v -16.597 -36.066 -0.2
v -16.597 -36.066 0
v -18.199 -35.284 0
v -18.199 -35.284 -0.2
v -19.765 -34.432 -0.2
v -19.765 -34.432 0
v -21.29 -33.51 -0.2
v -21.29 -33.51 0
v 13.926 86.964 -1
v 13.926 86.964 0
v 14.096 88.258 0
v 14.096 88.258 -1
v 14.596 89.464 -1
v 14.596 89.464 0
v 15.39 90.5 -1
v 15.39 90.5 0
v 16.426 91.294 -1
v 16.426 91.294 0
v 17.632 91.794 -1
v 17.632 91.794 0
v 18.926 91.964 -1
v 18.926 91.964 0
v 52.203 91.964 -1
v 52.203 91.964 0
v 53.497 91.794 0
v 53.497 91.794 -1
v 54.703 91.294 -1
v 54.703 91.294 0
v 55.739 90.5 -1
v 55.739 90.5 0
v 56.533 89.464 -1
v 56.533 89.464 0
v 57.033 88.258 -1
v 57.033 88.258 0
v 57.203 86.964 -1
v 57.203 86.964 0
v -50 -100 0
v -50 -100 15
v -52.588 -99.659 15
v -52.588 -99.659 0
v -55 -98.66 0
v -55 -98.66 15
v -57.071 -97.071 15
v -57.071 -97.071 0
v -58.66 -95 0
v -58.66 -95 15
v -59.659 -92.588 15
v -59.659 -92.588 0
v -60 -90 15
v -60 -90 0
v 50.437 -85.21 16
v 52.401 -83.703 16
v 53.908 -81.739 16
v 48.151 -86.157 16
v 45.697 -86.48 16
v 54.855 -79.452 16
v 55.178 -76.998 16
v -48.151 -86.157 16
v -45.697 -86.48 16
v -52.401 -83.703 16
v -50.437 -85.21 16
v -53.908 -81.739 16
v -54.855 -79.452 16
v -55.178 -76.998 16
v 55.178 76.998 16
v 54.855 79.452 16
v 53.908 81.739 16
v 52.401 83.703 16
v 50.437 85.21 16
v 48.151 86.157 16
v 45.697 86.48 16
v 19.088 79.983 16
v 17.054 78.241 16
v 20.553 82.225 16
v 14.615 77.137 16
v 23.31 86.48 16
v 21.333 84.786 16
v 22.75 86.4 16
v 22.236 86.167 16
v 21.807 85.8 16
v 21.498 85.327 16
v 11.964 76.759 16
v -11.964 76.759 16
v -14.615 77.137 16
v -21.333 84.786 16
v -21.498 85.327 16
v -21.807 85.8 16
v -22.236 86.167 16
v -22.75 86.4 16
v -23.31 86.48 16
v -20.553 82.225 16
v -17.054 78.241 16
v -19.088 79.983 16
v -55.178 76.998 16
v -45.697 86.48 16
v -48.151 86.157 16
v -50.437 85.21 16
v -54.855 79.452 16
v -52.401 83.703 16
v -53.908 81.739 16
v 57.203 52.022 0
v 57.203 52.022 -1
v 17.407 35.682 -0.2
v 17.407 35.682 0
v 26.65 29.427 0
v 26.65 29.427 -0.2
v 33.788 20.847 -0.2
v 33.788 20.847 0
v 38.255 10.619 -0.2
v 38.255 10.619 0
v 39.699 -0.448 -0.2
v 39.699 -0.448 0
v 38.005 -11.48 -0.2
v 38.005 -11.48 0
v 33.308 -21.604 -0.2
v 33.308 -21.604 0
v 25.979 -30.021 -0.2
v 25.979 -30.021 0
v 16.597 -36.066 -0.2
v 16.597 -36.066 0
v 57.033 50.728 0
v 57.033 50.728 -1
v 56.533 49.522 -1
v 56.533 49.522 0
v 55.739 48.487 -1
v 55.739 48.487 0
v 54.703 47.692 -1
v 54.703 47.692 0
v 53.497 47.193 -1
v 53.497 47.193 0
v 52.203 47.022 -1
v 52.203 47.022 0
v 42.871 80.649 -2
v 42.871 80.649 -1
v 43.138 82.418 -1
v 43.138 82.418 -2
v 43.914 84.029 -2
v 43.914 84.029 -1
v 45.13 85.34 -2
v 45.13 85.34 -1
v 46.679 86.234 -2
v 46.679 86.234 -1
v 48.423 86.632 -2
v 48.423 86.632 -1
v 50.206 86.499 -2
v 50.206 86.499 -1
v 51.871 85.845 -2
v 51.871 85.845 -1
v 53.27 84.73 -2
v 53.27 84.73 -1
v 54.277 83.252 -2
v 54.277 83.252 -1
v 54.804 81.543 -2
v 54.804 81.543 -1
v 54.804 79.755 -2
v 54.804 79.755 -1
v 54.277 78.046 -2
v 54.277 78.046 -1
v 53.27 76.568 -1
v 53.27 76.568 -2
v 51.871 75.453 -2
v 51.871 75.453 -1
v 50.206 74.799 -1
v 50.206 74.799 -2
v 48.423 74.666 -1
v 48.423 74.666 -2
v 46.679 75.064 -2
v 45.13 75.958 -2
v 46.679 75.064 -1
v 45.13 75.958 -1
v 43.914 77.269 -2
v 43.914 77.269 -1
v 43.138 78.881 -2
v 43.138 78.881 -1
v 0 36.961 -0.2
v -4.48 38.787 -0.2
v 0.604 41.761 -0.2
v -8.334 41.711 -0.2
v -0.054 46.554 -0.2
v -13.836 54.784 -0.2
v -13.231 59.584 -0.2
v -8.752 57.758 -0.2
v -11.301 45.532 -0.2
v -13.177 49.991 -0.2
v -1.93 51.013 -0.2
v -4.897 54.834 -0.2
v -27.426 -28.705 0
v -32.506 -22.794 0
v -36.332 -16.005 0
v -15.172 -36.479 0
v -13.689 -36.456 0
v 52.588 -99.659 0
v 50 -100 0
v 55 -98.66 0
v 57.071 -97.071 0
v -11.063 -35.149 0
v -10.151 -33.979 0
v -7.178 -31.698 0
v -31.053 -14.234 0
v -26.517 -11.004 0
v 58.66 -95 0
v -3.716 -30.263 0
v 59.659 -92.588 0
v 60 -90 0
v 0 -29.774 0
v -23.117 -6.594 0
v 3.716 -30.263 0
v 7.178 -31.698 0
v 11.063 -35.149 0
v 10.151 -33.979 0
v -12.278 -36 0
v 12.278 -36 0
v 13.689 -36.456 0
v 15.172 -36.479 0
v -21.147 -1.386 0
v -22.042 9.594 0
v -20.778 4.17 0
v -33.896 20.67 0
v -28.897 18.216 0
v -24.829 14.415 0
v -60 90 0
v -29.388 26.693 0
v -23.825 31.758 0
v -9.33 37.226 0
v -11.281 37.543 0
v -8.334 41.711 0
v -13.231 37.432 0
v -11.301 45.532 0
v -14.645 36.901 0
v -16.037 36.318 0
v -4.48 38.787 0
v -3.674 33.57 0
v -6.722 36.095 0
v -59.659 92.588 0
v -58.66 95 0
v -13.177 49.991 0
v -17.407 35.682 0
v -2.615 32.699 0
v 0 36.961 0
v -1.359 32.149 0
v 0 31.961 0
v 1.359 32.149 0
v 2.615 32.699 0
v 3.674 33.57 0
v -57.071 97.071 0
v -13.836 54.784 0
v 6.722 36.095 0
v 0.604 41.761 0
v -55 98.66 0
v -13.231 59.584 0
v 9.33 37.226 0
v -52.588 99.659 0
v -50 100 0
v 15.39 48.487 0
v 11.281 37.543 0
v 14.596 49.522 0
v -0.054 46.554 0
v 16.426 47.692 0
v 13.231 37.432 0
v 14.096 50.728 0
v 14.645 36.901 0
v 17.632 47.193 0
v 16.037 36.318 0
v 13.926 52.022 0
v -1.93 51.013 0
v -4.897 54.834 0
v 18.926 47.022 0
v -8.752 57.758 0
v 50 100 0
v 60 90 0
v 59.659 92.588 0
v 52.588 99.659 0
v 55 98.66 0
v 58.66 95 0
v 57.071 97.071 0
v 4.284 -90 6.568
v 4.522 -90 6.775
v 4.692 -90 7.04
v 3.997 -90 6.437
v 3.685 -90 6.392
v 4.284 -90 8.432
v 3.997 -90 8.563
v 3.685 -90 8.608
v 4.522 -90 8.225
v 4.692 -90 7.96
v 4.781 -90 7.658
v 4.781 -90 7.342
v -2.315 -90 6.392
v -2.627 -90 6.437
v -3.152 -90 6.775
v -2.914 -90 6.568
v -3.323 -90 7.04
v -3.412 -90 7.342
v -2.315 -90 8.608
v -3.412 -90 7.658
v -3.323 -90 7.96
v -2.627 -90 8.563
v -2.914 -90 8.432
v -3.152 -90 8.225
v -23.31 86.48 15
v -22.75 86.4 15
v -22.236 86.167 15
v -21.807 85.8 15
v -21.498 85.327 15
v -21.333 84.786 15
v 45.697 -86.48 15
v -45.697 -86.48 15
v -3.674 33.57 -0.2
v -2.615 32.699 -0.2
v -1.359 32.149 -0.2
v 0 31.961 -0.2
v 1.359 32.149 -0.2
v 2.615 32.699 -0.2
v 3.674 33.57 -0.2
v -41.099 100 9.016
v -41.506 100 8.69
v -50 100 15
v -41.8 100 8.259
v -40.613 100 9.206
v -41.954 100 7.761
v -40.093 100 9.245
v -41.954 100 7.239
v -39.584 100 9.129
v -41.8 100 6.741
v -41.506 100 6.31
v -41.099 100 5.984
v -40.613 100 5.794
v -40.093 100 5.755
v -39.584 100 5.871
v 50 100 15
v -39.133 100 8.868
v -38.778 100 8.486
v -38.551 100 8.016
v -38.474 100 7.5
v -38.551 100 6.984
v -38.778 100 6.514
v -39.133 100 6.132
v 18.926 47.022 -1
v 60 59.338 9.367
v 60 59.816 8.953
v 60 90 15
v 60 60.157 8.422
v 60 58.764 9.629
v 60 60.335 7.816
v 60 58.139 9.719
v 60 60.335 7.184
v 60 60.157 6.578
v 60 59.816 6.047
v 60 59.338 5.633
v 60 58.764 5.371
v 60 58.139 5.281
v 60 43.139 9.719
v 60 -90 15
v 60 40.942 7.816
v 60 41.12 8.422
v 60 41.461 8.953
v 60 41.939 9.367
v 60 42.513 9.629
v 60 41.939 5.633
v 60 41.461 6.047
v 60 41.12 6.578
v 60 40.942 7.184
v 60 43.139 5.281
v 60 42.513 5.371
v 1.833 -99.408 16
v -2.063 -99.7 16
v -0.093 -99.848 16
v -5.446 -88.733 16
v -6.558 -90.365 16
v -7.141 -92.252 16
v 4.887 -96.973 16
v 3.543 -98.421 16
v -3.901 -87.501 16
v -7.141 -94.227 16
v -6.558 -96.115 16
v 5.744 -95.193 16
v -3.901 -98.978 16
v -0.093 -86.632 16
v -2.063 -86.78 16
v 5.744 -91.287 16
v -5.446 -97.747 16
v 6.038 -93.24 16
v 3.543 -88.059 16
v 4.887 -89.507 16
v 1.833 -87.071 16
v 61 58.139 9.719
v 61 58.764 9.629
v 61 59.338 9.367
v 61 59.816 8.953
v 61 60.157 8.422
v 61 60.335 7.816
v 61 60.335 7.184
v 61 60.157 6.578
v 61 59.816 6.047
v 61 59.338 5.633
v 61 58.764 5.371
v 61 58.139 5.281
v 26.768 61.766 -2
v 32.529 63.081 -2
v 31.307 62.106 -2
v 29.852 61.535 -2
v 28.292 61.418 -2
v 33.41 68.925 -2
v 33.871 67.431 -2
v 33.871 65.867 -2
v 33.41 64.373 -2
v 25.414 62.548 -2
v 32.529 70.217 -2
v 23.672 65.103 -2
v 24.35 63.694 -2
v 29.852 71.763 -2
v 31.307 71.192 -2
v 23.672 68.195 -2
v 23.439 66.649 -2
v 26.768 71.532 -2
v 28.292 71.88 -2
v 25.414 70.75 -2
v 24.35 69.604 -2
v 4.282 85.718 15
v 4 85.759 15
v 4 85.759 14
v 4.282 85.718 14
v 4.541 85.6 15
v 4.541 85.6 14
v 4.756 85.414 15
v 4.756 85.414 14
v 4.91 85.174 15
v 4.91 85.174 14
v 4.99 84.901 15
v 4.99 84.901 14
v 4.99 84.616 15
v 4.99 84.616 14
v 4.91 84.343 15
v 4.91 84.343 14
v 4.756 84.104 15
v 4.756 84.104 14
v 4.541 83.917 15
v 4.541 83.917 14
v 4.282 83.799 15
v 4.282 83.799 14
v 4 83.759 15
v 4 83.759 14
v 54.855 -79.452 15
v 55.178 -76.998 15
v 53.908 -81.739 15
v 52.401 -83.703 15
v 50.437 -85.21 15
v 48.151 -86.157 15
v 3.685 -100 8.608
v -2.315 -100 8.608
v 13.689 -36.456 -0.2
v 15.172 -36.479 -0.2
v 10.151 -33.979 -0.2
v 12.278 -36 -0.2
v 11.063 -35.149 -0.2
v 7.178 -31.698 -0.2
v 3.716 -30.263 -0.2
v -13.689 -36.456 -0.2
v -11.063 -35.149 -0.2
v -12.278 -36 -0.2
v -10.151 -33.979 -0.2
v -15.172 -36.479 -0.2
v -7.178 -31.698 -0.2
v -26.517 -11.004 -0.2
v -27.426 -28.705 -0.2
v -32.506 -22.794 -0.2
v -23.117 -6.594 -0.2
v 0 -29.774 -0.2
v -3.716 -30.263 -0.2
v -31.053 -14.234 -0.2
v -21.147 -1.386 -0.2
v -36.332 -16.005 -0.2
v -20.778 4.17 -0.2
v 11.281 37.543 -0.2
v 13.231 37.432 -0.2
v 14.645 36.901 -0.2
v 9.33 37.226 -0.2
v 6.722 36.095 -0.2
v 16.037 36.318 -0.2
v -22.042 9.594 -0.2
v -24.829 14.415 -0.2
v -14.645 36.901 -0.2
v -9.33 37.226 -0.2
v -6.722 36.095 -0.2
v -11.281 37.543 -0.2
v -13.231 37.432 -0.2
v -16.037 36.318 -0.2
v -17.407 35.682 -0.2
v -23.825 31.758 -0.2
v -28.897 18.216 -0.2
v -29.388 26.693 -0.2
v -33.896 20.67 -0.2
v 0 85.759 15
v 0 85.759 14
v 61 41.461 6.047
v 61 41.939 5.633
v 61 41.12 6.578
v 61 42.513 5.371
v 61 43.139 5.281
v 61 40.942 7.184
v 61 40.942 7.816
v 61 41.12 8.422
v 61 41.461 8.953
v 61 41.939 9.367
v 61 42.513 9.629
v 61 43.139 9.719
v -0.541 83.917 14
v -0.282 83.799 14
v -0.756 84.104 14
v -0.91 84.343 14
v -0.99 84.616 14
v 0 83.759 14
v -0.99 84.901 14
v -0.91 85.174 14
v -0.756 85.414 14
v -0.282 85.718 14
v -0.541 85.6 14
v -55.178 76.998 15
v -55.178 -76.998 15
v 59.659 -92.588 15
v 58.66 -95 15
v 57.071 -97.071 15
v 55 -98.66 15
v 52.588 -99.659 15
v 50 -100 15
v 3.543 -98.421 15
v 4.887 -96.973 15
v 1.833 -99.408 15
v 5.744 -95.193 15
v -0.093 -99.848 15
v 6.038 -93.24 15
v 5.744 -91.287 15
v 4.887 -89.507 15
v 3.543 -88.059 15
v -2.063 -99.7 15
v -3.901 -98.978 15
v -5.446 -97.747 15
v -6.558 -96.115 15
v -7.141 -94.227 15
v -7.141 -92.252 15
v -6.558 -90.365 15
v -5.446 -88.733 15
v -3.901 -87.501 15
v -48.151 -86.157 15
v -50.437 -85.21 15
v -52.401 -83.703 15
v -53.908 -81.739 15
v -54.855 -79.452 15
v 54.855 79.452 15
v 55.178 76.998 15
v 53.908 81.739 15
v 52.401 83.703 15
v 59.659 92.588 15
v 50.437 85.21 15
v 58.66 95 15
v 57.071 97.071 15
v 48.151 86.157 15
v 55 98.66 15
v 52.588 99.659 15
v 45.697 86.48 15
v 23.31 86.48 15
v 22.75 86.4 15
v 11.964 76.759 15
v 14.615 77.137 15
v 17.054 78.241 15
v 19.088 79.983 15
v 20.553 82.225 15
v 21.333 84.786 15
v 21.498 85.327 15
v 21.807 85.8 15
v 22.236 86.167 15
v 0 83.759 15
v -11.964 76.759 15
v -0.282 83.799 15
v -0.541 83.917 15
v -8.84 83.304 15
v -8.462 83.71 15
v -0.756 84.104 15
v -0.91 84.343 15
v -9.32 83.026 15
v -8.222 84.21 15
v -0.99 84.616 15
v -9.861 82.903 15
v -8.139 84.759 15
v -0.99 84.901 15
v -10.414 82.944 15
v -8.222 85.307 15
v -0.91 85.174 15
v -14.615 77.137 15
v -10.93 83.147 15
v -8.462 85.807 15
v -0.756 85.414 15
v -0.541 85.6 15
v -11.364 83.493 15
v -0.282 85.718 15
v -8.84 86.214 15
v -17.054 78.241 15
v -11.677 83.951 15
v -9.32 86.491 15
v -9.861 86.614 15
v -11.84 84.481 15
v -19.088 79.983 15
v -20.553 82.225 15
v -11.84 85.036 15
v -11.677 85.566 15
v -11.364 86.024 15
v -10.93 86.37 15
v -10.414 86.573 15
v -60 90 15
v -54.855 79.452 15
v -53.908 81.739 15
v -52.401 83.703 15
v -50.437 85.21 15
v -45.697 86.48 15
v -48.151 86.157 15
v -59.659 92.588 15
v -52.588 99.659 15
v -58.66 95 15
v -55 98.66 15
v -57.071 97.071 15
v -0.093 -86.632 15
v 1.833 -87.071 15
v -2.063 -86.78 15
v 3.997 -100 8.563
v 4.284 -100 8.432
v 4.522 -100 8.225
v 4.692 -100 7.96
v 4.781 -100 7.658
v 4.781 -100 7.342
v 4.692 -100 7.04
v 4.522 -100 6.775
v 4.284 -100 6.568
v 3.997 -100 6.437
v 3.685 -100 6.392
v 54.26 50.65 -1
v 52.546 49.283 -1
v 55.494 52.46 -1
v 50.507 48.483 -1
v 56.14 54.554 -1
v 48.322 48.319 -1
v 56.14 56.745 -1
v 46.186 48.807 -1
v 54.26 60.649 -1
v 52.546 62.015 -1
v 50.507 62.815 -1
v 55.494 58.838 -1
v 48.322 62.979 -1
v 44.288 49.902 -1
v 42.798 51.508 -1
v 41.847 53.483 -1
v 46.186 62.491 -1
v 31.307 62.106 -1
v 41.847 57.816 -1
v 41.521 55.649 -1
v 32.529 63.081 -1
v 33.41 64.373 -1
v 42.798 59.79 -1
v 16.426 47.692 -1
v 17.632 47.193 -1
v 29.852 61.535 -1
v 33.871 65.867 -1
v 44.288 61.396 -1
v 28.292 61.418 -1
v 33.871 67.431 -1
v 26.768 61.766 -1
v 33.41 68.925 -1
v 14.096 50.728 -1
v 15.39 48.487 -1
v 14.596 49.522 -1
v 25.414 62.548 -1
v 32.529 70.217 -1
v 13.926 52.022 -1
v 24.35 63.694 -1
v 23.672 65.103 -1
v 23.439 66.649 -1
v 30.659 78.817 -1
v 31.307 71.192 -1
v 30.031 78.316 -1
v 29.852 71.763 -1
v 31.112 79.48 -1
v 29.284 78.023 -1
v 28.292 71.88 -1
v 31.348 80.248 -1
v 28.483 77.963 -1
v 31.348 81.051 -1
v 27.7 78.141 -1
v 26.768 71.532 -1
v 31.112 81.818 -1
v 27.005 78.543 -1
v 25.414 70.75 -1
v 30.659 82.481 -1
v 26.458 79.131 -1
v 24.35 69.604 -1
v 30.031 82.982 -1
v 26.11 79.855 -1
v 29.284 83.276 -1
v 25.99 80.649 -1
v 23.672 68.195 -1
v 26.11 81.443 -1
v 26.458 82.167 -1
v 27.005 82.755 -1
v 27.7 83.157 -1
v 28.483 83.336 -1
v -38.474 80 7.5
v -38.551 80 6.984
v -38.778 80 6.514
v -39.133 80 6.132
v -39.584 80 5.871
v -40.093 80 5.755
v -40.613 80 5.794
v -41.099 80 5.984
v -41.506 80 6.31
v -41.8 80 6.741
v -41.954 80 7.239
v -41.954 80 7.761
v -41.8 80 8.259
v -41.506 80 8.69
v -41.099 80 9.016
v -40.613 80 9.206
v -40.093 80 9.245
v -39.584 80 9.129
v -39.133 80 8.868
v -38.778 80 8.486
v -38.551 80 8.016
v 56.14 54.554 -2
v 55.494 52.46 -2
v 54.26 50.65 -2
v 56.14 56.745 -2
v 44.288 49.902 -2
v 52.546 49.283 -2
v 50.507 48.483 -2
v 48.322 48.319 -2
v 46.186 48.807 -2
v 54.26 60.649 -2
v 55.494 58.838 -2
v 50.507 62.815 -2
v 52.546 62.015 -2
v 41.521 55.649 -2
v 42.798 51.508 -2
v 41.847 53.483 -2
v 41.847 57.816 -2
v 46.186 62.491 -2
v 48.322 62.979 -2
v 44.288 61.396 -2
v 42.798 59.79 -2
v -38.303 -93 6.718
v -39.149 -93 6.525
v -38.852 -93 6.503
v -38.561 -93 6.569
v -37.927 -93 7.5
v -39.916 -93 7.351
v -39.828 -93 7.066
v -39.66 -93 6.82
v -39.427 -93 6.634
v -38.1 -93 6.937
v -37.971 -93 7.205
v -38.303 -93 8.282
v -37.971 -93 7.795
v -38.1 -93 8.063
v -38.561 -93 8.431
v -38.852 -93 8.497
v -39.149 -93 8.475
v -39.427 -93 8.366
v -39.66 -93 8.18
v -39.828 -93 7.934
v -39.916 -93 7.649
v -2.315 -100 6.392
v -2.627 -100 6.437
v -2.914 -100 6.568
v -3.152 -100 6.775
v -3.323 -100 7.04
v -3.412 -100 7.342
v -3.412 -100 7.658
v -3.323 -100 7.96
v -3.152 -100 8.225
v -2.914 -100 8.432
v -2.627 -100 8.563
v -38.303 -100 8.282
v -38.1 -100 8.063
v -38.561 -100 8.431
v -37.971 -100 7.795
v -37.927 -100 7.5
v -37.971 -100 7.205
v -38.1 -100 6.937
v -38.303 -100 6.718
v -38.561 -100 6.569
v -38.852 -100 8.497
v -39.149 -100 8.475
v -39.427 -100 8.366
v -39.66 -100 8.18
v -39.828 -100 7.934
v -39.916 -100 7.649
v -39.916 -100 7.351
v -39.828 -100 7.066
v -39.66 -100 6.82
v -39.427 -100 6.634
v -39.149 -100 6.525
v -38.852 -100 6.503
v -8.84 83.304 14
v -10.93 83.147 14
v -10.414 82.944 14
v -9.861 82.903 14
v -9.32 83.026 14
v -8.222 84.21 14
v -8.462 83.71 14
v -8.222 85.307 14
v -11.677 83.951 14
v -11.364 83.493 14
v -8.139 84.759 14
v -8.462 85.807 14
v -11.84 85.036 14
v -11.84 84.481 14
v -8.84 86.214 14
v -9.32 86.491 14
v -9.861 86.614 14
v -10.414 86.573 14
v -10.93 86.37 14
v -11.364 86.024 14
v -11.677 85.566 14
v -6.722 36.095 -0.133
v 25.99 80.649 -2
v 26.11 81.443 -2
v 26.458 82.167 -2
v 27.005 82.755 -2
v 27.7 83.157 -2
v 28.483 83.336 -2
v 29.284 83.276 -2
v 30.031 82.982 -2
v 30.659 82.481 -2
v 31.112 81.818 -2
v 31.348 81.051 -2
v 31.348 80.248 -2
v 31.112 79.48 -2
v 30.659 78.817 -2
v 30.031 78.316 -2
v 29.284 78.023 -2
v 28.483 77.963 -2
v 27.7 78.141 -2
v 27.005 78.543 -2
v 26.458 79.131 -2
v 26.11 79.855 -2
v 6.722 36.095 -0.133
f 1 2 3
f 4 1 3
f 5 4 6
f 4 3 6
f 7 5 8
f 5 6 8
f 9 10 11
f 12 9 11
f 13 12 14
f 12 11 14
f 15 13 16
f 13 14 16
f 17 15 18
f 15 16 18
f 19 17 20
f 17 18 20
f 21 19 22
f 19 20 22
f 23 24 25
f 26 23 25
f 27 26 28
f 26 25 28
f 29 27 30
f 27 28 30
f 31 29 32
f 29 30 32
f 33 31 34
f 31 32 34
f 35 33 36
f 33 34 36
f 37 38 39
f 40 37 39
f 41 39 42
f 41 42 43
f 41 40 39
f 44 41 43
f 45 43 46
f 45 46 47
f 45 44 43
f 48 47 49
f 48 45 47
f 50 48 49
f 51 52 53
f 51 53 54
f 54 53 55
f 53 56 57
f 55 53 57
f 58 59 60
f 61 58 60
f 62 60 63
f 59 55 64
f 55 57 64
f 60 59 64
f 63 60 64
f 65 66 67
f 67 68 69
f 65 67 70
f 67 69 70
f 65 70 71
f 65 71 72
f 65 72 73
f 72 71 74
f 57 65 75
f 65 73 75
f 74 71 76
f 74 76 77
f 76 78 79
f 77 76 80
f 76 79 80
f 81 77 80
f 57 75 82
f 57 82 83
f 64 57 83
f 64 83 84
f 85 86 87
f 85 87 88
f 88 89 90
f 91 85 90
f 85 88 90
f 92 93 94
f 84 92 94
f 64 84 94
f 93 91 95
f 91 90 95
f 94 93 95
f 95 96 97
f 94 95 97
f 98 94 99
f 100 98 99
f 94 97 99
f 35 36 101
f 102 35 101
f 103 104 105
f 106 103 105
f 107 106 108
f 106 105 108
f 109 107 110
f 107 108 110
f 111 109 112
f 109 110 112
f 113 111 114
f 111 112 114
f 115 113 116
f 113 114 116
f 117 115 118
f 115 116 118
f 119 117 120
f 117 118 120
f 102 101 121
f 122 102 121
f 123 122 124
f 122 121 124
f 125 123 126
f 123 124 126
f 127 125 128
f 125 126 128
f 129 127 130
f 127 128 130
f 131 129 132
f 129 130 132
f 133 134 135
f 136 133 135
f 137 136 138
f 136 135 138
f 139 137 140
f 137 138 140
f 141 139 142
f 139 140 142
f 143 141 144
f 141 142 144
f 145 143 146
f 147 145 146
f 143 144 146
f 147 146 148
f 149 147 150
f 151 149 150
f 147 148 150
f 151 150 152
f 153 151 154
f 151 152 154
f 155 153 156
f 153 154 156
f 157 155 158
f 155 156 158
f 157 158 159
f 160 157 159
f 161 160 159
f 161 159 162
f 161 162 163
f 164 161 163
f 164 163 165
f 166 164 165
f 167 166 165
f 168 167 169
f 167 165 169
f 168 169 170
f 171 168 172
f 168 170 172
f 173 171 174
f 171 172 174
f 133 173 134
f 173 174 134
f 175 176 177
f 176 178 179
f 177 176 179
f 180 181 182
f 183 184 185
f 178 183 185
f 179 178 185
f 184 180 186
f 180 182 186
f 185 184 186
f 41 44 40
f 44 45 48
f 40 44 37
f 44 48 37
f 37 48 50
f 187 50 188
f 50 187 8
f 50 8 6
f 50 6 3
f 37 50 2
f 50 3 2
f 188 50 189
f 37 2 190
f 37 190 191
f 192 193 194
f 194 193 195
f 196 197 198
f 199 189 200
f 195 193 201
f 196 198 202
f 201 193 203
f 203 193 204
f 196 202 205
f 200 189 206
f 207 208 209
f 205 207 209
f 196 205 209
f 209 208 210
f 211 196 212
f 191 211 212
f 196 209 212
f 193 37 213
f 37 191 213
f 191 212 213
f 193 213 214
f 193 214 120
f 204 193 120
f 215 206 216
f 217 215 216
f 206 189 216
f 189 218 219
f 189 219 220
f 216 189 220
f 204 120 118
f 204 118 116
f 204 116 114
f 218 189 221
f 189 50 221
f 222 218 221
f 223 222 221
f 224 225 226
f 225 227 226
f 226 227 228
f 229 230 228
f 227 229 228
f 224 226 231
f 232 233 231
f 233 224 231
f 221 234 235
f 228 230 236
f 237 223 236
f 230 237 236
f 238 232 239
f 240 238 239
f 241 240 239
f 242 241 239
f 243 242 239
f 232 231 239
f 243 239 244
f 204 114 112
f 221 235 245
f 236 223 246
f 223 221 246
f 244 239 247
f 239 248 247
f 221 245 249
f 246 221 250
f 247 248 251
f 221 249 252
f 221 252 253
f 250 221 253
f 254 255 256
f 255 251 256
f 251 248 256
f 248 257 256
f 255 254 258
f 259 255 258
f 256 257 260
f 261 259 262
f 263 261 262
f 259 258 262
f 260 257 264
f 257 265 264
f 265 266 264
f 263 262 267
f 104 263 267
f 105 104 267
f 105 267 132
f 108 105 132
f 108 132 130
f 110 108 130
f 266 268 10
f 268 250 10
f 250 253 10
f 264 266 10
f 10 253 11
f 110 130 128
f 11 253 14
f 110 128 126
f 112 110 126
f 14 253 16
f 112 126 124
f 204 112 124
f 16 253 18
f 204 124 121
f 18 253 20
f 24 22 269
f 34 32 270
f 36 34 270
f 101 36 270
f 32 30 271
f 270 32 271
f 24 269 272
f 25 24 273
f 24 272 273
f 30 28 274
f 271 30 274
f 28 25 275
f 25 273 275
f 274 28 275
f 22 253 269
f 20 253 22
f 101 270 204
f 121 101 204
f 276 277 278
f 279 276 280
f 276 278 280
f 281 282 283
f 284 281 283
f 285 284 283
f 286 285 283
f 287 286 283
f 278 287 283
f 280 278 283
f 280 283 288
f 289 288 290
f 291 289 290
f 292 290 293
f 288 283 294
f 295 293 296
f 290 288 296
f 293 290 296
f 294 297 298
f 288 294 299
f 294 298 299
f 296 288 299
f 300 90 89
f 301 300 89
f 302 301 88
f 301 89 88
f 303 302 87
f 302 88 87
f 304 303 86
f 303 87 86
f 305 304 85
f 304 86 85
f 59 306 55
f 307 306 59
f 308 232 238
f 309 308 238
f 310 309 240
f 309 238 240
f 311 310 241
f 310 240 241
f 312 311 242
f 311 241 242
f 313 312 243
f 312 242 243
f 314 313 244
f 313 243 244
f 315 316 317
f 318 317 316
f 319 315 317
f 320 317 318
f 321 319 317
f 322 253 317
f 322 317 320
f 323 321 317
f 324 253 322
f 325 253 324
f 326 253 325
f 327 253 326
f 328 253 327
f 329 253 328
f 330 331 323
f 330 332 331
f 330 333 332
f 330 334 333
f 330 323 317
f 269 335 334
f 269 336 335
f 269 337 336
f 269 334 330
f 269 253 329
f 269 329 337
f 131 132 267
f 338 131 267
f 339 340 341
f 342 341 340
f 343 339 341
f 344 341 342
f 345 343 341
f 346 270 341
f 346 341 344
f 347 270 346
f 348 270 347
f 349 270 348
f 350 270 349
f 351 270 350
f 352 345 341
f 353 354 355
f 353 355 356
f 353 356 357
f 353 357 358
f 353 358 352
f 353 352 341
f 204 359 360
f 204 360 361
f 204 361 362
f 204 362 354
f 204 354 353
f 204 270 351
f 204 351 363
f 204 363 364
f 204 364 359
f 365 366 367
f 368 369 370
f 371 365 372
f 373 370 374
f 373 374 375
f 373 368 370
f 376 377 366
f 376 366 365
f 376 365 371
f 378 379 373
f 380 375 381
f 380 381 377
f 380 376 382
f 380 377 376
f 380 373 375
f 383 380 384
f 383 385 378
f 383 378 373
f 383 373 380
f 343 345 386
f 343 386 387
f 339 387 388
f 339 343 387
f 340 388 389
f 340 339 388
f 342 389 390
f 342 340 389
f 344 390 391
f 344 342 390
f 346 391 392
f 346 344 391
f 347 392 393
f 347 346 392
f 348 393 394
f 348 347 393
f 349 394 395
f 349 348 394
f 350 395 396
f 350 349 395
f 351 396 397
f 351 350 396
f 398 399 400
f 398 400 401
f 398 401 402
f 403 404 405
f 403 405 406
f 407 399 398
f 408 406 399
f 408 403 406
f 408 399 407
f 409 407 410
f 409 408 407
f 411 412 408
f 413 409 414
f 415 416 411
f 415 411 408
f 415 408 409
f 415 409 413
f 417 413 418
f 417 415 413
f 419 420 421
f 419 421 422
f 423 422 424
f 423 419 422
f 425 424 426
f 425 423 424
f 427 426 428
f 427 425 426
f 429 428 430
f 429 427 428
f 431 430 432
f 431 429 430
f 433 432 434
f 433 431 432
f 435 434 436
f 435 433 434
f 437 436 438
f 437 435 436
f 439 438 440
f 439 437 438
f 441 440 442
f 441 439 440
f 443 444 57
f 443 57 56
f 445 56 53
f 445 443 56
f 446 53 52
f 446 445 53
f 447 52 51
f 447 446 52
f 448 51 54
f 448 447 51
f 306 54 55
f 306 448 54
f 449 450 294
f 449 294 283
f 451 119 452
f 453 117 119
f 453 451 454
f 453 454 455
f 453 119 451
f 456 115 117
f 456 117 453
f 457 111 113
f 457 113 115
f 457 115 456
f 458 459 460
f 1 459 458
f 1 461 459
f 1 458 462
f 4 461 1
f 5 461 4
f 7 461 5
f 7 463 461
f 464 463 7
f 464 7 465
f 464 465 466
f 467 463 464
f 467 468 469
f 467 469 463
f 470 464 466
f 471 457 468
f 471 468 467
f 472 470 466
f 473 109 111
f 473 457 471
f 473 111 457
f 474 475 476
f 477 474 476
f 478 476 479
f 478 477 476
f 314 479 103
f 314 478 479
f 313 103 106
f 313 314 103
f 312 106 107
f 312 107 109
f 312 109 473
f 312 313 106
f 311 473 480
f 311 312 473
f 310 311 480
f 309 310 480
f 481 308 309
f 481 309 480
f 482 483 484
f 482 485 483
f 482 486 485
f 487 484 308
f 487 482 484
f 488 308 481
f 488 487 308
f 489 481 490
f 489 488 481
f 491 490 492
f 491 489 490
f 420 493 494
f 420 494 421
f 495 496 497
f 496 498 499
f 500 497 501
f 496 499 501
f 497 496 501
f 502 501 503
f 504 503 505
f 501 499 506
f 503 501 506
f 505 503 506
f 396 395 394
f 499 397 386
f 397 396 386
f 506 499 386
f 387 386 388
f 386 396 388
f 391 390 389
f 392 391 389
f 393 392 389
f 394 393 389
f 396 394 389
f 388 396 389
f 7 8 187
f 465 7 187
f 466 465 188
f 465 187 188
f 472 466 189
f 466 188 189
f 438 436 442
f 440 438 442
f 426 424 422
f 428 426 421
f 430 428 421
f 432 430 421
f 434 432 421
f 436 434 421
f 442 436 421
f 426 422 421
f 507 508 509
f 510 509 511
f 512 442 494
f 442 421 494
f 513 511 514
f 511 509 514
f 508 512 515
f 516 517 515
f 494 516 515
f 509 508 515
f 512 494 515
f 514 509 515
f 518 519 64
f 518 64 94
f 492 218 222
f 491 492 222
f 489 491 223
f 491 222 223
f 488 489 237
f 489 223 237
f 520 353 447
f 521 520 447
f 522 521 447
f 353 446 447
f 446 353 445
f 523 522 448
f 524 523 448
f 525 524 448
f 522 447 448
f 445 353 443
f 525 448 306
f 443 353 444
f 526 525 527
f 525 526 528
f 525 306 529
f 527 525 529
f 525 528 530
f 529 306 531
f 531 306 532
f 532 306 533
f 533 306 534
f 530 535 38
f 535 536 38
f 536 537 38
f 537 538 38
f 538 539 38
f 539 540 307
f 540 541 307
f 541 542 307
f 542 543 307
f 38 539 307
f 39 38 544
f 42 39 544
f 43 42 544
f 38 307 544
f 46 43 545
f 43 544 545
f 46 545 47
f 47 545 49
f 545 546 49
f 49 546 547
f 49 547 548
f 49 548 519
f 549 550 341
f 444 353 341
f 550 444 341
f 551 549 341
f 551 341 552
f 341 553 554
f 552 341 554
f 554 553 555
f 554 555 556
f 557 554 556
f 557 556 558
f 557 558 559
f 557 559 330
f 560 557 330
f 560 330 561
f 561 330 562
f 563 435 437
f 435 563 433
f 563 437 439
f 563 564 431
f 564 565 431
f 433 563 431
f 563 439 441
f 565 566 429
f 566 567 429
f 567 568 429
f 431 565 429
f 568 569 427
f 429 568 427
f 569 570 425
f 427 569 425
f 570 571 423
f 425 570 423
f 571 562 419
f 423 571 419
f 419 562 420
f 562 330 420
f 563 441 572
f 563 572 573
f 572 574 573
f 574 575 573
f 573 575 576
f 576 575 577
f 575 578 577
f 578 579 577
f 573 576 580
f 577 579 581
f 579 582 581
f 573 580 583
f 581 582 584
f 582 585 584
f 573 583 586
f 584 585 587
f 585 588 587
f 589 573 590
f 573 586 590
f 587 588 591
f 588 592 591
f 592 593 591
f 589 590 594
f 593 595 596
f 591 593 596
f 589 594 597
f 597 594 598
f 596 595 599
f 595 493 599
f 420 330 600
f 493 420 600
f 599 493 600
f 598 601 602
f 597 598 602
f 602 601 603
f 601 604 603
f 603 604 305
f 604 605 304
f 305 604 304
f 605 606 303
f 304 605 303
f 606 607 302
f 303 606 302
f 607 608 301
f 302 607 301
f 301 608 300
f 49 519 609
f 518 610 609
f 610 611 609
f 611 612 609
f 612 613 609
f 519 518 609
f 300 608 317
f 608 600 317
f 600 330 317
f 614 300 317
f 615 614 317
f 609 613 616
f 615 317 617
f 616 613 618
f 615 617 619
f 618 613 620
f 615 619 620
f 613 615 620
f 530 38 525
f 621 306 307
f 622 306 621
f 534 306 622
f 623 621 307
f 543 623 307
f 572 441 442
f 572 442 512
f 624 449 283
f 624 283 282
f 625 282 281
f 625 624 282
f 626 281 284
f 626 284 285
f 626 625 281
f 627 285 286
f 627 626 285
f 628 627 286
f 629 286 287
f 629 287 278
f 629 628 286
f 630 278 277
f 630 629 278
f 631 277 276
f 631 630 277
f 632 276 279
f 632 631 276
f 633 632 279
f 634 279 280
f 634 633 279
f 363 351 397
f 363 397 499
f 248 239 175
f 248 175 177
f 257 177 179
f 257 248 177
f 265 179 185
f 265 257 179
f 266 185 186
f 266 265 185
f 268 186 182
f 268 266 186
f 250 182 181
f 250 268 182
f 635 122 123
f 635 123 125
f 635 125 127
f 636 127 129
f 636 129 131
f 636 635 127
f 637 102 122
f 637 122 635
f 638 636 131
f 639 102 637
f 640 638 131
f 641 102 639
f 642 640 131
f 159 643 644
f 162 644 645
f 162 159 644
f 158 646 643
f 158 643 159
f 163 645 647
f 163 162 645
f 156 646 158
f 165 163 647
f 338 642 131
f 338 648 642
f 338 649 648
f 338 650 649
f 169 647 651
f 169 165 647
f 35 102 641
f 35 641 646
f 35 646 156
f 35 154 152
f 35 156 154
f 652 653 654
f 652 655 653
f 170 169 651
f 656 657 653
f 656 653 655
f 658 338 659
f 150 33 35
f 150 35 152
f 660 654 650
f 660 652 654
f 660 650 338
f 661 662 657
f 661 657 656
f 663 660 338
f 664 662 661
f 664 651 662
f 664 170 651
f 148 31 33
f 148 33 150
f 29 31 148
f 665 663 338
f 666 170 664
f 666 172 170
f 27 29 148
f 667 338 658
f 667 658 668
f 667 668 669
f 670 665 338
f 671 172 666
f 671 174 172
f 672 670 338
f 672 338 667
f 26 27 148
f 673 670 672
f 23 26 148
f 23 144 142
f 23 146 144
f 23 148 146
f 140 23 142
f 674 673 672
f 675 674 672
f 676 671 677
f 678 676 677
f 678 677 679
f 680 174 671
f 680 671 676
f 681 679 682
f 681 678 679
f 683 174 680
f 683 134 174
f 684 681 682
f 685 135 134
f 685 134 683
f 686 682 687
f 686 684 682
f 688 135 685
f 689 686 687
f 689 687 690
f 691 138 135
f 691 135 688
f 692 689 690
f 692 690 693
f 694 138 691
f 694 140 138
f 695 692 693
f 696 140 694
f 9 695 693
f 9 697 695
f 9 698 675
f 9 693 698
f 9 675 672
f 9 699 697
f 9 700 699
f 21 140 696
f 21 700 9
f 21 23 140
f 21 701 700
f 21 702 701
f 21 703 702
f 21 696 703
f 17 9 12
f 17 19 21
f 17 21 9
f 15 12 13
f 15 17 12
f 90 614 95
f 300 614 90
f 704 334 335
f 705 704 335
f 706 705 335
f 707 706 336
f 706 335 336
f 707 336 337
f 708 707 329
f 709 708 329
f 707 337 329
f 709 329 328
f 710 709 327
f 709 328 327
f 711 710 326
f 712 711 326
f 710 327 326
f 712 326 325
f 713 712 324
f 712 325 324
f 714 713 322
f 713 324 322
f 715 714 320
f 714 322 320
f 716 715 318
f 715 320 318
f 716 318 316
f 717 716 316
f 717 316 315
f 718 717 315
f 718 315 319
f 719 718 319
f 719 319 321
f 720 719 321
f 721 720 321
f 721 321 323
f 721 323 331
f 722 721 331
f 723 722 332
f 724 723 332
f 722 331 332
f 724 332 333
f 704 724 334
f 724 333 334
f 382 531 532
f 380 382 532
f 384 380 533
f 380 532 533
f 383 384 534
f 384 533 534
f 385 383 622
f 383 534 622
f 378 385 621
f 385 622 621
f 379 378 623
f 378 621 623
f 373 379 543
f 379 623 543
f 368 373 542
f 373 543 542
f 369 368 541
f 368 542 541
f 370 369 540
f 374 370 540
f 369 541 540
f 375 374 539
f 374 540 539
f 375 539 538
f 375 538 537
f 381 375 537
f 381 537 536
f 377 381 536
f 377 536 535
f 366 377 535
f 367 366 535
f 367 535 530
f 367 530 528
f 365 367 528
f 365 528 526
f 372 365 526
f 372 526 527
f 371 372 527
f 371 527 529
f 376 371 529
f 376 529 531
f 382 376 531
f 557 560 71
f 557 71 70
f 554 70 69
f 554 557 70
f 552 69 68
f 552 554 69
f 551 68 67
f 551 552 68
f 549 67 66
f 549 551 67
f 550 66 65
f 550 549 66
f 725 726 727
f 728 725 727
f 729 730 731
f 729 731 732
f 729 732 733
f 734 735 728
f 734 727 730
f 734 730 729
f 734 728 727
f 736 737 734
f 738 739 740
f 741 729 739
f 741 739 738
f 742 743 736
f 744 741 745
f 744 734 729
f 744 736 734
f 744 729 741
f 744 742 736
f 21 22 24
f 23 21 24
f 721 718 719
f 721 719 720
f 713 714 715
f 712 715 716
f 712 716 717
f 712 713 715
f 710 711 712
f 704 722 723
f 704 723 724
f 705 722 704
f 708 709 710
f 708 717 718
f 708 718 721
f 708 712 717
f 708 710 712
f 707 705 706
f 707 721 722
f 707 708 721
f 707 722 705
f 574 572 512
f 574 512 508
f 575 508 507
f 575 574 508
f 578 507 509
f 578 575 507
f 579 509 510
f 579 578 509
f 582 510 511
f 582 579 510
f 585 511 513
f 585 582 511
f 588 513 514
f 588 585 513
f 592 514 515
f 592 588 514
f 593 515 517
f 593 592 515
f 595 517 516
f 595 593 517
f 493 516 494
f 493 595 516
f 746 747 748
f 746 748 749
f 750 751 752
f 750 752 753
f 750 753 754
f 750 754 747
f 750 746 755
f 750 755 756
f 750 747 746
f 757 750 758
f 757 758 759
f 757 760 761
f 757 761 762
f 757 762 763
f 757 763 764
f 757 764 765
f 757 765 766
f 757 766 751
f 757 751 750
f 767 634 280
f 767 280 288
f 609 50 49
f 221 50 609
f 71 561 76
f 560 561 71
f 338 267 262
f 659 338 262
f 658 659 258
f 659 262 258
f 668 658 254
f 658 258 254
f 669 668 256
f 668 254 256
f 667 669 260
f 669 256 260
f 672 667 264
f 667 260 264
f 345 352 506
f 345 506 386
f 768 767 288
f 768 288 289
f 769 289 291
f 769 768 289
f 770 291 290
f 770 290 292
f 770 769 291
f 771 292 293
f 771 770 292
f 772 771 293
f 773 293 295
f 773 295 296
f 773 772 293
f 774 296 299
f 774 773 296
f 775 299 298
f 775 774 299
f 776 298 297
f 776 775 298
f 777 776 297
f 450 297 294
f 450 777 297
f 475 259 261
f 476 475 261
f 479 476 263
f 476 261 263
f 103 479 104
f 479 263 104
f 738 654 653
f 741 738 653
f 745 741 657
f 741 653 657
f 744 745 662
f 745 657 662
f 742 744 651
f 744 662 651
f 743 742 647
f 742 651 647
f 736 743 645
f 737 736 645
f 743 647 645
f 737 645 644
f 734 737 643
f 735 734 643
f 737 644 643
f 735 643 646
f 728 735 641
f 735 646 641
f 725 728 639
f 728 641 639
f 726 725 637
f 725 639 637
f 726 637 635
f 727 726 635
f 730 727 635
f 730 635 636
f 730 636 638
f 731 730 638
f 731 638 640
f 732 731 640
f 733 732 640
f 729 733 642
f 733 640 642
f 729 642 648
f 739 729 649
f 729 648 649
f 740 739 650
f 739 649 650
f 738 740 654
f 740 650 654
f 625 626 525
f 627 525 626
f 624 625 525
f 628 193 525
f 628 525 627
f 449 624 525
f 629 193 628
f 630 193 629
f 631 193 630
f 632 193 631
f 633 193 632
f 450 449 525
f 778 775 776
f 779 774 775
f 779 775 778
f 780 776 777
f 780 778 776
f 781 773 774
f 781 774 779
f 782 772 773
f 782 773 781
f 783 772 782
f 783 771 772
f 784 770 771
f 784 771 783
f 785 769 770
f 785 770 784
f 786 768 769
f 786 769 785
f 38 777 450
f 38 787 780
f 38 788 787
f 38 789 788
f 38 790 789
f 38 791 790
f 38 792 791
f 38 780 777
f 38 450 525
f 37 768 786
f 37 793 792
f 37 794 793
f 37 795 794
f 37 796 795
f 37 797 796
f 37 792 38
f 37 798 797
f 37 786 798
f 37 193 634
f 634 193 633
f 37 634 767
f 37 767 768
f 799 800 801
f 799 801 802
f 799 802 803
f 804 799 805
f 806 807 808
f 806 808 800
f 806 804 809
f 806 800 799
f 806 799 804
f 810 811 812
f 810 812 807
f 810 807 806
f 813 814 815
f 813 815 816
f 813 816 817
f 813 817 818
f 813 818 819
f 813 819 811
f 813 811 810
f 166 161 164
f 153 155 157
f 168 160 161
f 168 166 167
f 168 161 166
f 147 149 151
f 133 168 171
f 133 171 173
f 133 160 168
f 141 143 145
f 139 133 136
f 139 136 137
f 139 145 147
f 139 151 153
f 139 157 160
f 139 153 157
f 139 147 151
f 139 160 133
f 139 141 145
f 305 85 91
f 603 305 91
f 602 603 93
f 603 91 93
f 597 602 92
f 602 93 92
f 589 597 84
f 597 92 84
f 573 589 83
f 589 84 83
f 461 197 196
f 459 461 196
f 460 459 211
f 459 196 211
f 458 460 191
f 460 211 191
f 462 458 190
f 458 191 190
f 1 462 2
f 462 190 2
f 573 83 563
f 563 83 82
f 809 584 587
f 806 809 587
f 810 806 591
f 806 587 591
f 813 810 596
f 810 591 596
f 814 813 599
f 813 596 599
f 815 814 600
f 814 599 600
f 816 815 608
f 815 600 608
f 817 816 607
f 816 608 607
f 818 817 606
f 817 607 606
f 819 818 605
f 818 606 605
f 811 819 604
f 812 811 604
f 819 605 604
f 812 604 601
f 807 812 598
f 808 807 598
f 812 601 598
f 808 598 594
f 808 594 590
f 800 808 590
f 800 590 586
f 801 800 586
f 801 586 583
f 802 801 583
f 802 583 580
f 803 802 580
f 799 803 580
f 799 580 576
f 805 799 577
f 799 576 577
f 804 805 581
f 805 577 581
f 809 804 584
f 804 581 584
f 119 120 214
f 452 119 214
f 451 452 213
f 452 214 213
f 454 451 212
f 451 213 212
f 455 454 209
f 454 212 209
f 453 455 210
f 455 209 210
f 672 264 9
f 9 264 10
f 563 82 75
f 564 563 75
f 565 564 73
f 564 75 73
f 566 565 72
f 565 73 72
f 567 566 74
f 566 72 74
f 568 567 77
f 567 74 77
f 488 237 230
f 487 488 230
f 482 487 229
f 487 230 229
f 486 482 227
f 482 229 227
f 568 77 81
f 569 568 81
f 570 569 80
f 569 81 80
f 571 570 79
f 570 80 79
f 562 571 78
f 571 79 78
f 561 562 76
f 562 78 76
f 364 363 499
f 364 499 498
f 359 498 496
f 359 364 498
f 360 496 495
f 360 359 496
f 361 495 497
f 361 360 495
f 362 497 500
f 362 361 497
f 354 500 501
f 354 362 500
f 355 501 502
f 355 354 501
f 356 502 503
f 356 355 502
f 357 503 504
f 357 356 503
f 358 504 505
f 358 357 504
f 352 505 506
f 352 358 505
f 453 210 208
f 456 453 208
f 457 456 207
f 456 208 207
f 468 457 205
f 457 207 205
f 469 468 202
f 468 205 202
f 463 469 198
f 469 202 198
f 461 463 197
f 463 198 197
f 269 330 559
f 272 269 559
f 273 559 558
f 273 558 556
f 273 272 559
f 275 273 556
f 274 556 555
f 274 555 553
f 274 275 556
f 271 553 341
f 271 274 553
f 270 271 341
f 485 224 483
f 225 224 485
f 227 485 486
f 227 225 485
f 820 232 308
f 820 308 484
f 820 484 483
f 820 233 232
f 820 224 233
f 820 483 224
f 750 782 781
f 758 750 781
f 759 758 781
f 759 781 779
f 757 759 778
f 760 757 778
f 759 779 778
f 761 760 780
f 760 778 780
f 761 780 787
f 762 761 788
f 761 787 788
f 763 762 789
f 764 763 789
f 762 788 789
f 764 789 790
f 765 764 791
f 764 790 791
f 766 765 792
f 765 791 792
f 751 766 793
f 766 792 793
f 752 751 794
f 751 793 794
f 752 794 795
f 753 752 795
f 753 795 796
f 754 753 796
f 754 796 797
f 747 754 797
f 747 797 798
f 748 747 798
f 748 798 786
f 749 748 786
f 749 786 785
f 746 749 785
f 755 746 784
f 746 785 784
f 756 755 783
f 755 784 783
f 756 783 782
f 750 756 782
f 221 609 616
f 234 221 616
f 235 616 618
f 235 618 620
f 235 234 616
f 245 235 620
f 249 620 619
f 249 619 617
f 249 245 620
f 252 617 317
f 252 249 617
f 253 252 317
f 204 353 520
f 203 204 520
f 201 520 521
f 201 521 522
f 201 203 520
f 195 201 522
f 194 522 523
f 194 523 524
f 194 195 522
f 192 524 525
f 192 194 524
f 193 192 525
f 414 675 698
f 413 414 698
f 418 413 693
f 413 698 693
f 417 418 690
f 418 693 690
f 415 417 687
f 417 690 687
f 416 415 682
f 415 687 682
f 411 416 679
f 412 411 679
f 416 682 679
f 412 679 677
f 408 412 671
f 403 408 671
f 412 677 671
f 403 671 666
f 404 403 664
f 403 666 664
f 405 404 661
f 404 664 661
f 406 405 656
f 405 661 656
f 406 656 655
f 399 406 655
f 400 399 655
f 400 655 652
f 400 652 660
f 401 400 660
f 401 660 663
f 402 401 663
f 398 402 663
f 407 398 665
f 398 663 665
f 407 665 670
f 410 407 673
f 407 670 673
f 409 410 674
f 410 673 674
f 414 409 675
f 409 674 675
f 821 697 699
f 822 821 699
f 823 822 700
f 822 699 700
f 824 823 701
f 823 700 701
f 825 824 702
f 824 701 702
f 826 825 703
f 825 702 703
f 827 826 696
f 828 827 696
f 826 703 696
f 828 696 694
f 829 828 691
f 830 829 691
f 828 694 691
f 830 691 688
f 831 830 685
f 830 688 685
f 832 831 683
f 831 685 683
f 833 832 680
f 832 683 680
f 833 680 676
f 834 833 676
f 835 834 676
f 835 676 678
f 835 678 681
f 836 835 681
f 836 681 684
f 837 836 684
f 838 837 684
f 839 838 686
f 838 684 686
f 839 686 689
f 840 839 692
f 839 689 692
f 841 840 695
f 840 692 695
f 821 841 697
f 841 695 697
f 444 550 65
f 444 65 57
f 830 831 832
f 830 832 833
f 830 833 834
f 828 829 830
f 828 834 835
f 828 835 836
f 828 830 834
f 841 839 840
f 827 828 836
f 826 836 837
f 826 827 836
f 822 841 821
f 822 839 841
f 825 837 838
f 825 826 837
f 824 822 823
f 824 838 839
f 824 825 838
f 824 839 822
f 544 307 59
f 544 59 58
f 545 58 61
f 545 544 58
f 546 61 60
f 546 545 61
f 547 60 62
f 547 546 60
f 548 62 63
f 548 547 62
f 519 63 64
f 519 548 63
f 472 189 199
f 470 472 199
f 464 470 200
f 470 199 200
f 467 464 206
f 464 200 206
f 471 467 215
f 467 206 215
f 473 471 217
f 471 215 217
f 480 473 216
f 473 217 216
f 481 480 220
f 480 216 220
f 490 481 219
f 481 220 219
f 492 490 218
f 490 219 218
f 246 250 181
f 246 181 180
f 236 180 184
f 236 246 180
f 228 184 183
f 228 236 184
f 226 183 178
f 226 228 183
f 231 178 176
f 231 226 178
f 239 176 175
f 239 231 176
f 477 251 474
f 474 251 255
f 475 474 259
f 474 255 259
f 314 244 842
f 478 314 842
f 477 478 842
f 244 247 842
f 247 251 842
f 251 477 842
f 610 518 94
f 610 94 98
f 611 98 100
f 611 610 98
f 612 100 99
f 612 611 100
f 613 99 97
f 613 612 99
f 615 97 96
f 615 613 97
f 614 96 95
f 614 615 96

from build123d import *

# Parameters (mm, degrees)
BOSS_EXTRUDE1_DEPTH  = 15
BOSS_EXTRUDE2_DEPTH  = 16
CUT_EXTRUDE1_DEPTH   = 1
SKETCH6_R            = 6.626408405
BOSS_EXTRUDE7_DEPTH  = 16
CUT_EXTRUDE3_DEPTH   = 10
SKETCH8_R            = 1.860980047
CUT_EXTRUDE6_DEPTH   = 1
BOSS_EXTRUDE10_DEPTH = 1
SKETCH10_R           = 1
CUT_EXTRUDE7_DEPTH   = 7
SKETCH11_R           = 1.75
CUT_EXTRUDE8_DEPTH   = 20
BOSS_EXTRUDE13_DEPTH = 1
SKETCH13_R           = 6
SKETCH13_R_2         = 7.350371073
SKETCH13_R_3         = 5.24539952
SKETCH13_R_4         = 2.694037488
BOSS_EXTRUDE14_DEPTH = 1
BOSS_EXTRUDE19_DEPTH = 0.2


with BuildPart() as part:
    # Sketch3 → Boss-Extrude1 (new body)
    with BuildSketch(Plane.XY):
        with BuildLine():
            Line((-50, 100), (50, 100))
            ThreePointArc((50, 100), (57.071067812, 97.071067812), (60, 90))
            Line((60, 90), (60, -90))
            ThreePointArc((60, -90), (57.071067812, -97.071067812), (50, -100))
            Line((50, -100), (-50, -100))
            ThreePointArc((-50, -100), (-57.071067812, -97.071067812), (-60, -90))
            Line((-60, -90), (-60, 90))
            ThreePointArc((-60, 90), (-57.071067812, 97.071067812), (-50, 100))
        make_face()
    extrude(amount=BOSS_EXTRUDE1_DEPTH)

    # Sketch4 → Boss-Extrude2 (add)
    with BuildSketch(Plane.XY):
        with BuildLine():
            Line((-45.696681728, 86.479793583), (45.696681728, 86.479793583))
            ThreePointArc((45.696681728, 86.479793583), (52.400974756, 83.702784485), (55.177983854, 76.998491457))
            Line((55.177983854, 76.998491457), (55.177983854, -76.998491457))
            ThreePointArc((55.177983854, -76.998491457), (52.400974756, -83.702784485), (45.696681728, -86.479793583))
            Line((45.696681728, -86.479793583), (-45.696681728, -86.479793583))
            ThreePointArc((-45.696681728, -86.479793583), (-52.400974756, -83.702784485), (-55.177983854, -76.998491457))
            Line((-55.177983854, -76.998491457), (-55.177983854, 76.998491457))
            ThreePointArc((-55.177983854, 76.998491457), (-52.400974756, 83.702784485), (-45.696681728, 86.479793583))
        make_face()
    extrude(amount=BOSS_EXTRUDE2_DEPTH)

    # Sketch5 → Cut-Extrude1 (cut)
    with BuildSketch(Plane.XY.offset(16)):
        with BuildLine():
            Line((-11.964009061, 76.758679218), (11.964009061, 76.758679218))
            ThreePointArc((11.964009061, 76.758679218), (18.133018595, 79.040091667), (21.333225963, 84.786411725))
            ThreePointArc((21.333225963, 84.786411725), (22.008282474, 85.998549041), (23.309582539, 86.479793583))
            Line((23.309582539, 86.479793583), (-7.969065225, 86.479793583))
            Line((-7.969065225, 86.479793583), (-23.309582539, 86.479793583))
            ThreePointArc((-23.309582539, 86.479793583), (-22.008282474, 85.998549041), (-21.333225963, 84.786411725))
            ThreePointArc((-21.333225963, 84.786411725), (-18.133018595, 79.040091667), (-11.964009061, 76.758679218))
        make_face()
    extrude(amount=-CUT_EXTRUDE1_DEPTH, mode=Mode.SUBTRACT)

    # Sketch6 → Boss-Extrude7 (add)
    with BuildSketch(Plane.XY):
        with Locations((-0.588195402, -93.239793583)):
            Circle(SKETCH6_R)
    extrude(amount=BOSS_EXTRUDE7_DEPTH)

    # Sketch7 → Cut-Extrude3 (cut)
    with BuildSketch(Plane.XZ.offset(100)):
        with BuildLine():
            Line((3.684816301, 6.392233542), (-2.315183699, 6.392233542))
            ThreePointArc((-2.315183699, 6.392233542), (-3.422950157, 7.5), (-2.315183699, 8.607766458))
            Line((-2.315183699, 8.607766458), (3.684816301, 8.607766458))
            ThreePointArc((3.684816301, 8.607766458), (4.792582759, 7.5), (3.684816301, 6.392233542))
        make_face()
    extrude(amount=-CUT_EXTRUDE3_DEPTH, mode=Mode.SUBTRACT)

    # Sketch8 → Cut-Extrude6 (cut)
    with BuildSketch(Plane.XY.offset(15)):
        with Locations((-10, 84.758679218)):
            Circle(SKETCH8_R)
        with BuildLine():
            Line((0, 85.758679218), (4, 85.758679218))
            ThreePointArc((4, 85.758679218), (5, 84.758679218), (4, 83.758679218))
            Line((4, 83.758679218), (0, 83.758679218))
            ThreePointArc((0, 83.758679218), (-1, 84.758679218), (0, 85.758679218))
        make_face()
    extrude(amount=-CUT_EXTRUDE6_DEPTH, mode=Mode.SUBTRACT)

    # Sketch9 → Boss-Extrude10 (add)
    with BuildSketch(Plane(origin=(60, 0, 0), x_dir=(0, 0, -1), z_dir=(1, 0, 0))):
        with BuildLine():
            Line((-5.280651792, 58.138580799), (-5.280651792, 43.138580799))
            ThreePointArc((-5.280651792, 43.138580799), (-7.5, 40.919232591), (-9.719348208, 43.138580799))
            Line((-9.719348208, 43.138580799), (-9.719348208, 58.138580799))
            ThreePointArc((-9.719348208, 58.138580799), (-7.5, 60.357929008), (-5.280651792, 58.138580799))
        make_face()
    extrude(amount=BOSS_EXTRUDE10_DEPTH)

    # Sketch10 → Cut-Extrude7 (cut)
    with BuildSketch(Plane.XZ.offset(100)):
        with Locations((-38.926720921, 7.5)):
            Circle(SKETCH10_R)
    extrude(amount=-CUT_EXTRUDE7_DEPTH, mode=Mode.SUBTRACT)

    # Sketch11 → Cut-Extrude8 (cut)
    with BuildSketch(Plane(origin=(0, 100, 0), x_dir=(1, 0, 0), z_dir=(0, 1, 0))):
        with Locations((-40.22365253, -7.5)):
            Circle(SKETCH11_R)
    extrude(amount=-CUT_EXTRUDE8_DEPTH, mode=Mode.SUBTRACT)

    # Sketch12 → Boss-Extrude13 (add)
    with BuildSketch(Plane(origin=(0, 0, 0), x_dir=(-1, 0, 0), z_dir=(0, 0, -1))):
        with BuildLine():
            Line((-18.925763354, 91.964241382), (-52.203053416, 91.964241382))
            ThreePointArc((-52.203053416, 91.964241382), (-55.738587322, 90.499775288), (-57.203053416, 86.964241382))
            Line((-57.203053416, 86.964241382), (-57.203053416, 52.022440164))
            ThreePointArc((-57.203053416, 52.022440164), (-55.738587322, 48.486906258), (-52.203053416, 47.022440164))
            Line((-52.203053416, 47.022440164), (-18.925763354, 47.022440164))
            ThreePointArc((-18.925763354, 47.022440164), (-15.390229448, 48.486906258), (-13.925763354, 52.022440164))
            Line((-13.925763354, 52.022440164), (-13.925763354, 86.964241382))
            ThreePointArc((-13.925763354, 86.964241382), (-15.390229448, 90.499775288), (-18.925763354, 91.964241382))
        make_face()
    extrude(amount=BOSS_EXTRUDE13_DEPTH)

    # Sketch13 → Boss-Extrude14 (add)
    with BuildSketch(Plane(origin=(0, 0, -1), x_dir=(-1, 0, 0), z_dir=(0, 0, -1))):
        with Locations((-48.871309333, 80.649061989)):
            Circle(SKETCH13_R)
        with Locations((-48.871309333, 55.649061989)):
            Circle(SKETCH13_R_2)
        with Locations((-28.684304458, 66.649061989)):
            Circle(SKETCH13_R_3)
        with Locations((-28.684304458, 80.649061989)):
            Circle(SKETCH13_R_4)
    extrude(amount=BOSS_EXTRUDE14_DEPTH)

    # Sketch14 → Boss-Extrude19 (add)
    with BuildSketch(Plane(origin=(0, 0, 0), x_dir=(-1, 0, 0), z_dir=(0, 0, -1))):
        with BuildLine():
            add(Edge.make_bspline(
                [(-3.674445913, 33.570119731), (-6.586996245, 36.726182993), (-9.97051323, 37.977315522), (-13.231414187, 37.431600611)],
                knots=[0.231070837, 0.231070837, 0.231070837, 0.231070837, 0.765352683, 0.765352683, 0.765352683, 0.765352683], degree=3))
            ThreePointArc((-13.231414187, 37.431600611), (-15.343951329, 36.616365238), (-17.406574019, 35.68201545))
            ThreePointArc((-17.406574019, 35.68201545), (-39.698794696, -0.448046182), (-16.596818278, -36.065782519))
            ThreePointArc((-16.596818278, -36.065782519), (-12.966582836, -36.280567352), (-10.151005098, -33.978988787))
            ThreePointArc((-10.151005098, -33.978988787), (0, -29.774304804), (10.151005098, -33.978988787))
            ThreePointArc((10.151005098, -33.978988787), (12.966582836, -36.280567352), (16.596818278, -36.065782519))
            ThreePointArc((16.596818278, -36.065782519), (18.986564068, -34.866967613), (21.29020582, -33.510031062))
            ThreePointArc((21.29020582, -33.510031062), (30.111316996, -25.874768297), (36.332224295, -16.005140531))
            ThreePointArc((36.332224295, -16.005140531), (20.757436471, 1.37873001), (33.896238409, 20.669786341))
            ThreePointArc((33.896238409, 20.669786341), (26.727072351, 29.357429199), (17.406574019, 35.68201545))
            ThreePointArc((17.406574019, 35.68201545), (15.343951329, 36.616365238), (13.231414187, 37.431600611))
            add(Edge.make_bspline(
                [(3.674445913, 33.570119731), (6.586996245, 36.726182993), (9.97051323, 37.977315522), (13.231414187, 37.431600611)],
                knots=[0.231070837, 0.231070837, 0.231070837, 0.231070837, 0.765352683, 0.765352683, 0.765352683, 0.765352683], degree=3))
            ThreePointArc((3.674445913, 33.570119731), (0, 31.961055772), (-3.674445913, 33.570119731))
        make_face()
        with BuildLine():
            ThreePointArc((13.231414187, 59.583781152), (11.301026929, 45.532102859), (0, 36.961055772))
            ThreePointArc((0, 36.961055772), (1.930387259, 51.012734065), (13.231414187, 59.583781152))
        make_face()
    extrude(amount=BOSS_EXTRUDE19_DEPTH)


solid = part.part
